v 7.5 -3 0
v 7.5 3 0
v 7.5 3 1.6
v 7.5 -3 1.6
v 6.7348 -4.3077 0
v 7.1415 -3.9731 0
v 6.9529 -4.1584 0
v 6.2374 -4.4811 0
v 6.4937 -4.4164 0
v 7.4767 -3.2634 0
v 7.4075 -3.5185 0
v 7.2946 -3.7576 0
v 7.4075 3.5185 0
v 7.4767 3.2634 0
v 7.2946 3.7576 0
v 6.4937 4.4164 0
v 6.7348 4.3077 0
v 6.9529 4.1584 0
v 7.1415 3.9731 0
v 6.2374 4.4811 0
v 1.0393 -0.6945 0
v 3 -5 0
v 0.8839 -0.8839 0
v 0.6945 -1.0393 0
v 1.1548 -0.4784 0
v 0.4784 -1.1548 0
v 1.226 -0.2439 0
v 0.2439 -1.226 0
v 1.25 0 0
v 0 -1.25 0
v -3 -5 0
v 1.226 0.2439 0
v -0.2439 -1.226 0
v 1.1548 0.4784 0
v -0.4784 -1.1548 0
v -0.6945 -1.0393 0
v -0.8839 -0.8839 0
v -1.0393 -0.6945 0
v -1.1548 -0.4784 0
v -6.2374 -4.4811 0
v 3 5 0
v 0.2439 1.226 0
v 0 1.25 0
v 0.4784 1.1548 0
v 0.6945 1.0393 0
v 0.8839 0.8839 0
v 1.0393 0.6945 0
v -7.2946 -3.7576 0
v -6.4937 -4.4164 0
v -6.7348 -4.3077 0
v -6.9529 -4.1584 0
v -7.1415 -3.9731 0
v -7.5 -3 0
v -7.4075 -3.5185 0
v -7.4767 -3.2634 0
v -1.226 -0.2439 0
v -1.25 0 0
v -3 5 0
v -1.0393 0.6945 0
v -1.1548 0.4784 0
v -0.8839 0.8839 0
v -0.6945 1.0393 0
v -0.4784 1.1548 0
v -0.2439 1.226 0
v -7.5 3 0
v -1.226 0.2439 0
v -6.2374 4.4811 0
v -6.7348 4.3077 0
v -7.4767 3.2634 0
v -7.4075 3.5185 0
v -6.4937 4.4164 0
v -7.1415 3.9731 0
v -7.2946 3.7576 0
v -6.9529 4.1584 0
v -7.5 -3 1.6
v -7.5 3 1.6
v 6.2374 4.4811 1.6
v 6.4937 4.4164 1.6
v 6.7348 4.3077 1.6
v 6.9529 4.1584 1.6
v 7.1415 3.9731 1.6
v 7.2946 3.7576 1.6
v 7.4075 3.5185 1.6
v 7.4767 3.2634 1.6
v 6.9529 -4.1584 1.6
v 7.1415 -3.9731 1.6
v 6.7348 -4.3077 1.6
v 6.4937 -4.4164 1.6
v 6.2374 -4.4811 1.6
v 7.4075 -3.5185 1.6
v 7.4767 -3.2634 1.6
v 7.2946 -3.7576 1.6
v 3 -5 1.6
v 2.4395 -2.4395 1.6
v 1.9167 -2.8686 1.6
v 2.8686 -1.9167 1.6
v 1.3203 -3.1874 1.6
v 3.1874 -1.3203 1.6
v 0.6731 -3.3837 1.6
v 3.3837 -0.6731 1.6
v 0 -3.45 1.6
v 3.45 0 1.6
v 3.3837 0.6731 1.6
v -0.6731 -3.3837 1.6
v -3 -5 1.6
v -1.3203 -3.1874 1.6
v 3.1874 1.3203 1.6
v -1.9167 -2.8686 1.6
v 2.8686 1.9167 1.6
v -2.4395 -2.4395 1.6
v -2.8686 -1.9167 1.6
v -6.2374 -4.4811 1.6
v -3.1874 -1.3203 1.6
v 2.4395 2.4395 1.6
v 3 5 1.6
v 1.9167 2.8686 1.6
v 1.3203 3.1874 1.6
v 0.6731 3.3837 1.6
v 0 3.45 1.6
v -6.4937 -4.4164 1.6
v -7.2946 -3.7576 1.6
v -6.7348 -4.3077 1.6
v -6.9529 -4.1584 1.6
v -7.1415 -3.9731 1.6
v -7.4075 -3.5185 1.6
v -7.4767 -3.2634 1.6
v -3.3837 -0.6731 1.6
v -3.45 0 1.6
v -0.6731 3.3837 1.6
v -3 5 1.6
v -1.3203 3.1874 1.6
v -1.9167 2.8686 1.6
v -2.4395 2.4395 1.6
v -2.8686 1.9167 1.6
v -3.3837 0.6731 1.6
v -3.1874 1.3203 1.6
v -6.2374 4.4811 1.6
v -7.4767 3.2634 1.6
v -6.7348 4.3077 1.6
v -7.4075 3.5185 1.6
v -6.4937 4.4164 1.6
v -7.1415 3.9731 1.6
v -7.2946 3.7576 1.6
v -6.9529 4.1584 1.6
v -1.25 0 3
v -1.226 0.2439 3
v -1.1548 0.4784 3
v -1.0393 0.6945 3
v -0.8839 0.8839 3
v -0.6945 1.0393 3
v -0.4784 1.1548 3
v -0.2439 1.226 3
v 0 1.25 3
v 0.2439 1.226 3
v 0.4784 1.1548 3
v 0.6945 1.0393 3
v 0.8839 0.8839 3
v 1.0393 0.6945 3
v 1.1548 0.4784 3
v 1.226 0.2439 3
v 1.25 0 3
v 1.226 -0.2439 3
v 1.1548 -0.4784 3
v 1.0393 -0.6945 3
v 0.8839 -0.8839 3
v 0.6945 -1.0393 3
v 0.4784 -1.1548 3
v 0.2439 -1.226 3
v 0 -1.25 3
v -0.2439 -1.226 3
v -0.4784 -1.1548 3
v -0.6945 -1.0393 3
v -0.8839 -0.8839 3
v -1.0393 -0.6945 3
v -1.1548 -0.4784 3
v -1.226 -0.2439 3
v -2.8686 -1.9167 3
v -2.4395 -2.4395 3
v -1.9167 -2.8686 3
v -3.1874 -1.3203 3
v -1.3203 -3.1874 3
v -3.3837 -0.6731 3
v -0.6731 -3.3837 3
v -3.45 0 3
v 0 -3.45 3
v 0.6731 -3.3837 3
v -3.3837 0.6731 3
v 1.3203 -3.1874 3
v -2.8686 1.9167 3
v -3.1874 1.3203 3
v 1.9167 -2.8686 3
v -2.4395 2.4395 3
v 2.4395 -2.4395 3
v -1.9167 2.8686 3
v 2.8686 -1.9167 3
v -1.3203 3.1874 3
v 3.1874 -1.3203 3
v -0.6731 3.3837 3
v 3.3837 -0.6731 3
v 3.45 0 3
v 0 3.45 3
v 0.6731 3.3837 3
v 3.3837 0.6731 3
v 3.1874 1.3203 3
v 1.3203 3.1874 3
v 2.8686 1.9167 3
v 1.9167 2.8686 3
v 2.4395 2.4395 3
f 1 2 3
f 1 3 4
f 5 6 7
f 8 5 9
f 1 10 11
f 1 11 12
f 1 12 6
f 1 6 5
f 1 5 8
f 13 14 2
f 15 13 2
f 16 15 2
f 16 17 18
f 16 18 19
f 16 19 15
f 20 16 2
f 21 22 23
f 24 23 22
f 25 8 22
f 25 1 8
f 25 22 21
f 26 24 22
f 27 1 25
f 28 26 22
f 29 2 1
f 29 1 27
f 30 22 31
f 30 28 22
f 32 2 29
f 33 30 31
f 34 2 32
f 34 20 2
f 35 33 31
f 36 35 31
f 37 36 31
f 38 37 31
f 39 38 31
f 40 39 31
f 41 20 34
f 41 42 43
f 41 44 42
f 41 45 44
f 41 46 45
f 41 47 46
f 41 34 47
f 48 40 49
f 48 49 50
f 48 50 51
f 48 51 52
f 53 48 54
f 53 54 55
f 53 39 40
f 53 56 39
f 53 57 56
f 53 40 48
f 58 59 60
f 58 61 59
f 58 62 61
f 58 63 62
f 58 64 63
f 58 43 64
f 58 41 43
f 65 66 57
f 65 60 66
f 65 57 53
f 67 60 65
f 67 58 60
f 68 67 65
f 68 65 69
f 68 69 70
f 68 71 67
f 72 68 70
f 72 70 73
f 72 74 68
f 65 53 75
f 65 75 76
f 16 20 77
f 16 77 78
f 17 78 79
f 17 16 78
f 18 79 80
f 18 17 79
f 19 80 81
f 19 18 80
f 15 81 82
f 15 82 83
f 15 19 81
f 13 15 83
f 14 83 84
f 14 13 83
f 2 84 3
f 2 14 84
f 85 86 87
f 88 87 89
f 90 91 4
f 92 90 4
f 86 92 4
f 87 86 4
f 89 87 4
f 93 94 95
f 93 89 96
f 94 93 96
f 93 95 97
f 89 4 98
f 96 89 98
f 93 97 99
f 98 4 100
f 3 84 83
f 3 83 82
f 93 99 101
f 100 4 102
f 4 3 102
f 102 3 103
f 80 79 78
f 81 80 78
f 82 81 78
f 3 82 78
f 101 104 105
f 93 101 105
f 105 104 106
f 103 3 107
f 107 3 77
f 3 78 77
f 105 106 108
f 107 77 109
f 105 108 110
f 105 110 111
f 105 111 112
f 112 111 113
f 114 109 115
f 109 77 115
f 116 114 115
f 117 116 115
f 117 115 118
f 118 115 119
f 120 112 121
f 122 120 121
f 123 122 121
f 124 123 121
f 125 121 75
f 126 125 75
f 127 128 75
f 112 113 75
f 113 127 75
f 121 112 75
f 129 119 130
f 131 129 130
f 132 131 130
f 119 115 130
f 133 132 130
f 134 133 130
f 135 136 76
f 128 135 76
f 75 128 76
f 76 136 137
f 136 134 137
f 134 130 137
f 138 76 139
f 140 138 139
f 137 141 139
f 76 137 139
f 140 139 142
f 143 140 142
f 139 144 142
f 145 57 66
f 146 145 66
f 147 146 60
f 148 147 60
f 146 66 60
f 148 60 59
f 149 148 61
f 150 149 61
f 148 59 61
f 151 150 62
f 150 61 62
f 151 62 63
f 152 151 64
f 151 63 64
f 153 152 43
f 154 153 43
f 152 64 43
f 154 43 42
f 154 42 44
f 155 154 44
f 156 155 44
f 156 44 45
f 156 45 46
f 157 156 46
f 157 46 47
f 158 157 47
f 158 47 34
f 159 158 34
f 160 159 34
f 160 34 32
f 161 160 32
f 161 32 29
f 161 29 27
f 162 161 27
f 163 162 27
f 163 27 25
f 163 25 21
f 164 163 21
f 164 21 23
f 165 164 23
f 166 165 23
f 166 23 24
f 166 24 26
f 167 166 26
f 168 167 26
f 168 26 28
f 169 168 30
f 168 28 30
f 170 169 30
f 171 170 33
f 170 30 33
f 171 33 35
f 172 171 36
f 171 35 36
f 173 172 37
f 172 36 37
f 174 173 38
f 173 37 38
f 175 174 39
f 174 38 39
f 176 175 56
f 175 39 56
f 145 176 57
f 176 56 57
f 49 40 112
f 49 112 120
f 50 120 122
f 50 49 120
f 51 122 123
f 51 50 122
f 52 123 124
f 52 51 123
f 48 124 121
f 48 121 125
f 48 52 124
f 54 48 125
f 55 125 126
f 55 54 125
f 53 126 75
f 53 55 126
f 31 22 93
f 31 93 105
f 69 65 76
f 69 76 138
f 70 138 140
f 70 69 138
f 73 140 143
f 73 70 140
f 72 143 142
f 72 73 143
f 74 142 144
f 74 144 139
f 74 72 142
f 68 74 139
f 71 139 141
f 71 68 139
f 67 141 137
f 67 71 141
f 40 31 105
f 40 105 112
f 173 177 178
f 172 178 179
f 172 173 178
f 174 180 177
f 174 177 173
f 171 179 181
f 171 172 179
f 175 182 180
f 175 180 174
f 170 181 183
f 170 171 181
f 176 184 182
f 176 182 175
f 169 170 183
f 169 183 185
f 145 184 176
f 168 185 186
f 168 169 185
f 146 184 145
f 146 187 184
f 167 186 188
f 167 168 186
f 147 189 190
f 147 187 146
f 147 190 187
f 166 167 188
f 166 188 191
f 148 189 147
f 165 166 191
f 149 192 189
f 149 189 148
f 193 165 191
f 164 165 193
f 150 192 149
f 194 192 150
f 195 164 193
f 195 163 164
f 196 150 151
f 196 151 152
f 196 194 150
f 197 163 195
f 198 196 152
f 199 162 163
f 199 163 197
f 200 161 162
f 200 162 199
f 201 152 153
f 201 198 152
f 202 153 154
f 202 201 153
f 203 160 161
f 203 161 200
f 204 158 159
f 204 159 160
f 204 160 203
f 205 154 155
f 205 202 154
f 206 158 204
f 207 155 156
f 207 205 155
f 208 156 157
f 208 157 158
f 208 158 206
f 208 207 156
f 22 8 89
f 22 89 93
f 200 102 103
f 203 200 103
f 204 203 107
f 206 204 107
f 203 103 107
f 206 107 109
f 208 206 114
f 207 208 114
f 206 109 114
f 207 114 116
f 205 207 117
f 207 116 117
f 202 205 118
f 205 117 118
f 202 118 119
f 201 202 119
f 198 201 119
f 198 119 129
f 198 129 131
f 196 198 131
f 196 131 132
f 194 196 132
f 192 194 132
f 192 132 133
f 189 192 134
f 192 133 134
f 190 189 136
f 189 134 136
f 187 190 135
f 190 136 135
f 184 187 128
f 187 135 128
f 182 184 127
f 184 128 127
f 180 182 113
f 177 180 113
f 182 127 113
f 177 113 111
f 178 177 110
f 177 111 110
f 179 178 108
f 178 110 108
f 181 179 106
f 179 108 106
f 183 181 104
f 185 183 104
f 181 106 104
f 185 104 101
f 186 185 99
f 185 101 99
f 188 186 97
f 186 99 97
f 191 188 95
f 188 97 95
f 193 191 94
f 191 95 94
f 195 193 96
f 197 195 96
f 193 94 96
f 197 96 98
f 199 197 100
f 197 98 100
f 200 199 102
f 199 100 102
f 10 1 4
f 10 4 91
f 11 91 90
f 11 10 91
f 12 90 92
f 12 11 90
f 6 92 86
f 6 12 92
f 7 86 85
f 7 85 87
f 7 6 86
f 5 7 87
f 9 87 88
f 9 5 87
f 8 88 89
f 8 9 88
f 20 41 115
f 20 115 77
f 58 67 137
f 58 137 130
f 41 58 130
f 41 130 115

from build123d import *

# Parameters (mm, degrees)
BOSS_EXTRUDE1_DEPTH   = 1.6
SKETCH2_R             = 3.45
BOSS_EXTRUDE2_DEPTH   = 1.4
M3X0_5_TAPPED_HOLE1_D = 2.5


with BuildPart() as part:
    # Sketch1 → Boss-Extrude1 (new body)
    with BuildSketch(Plane.XY):
        with BuildLine():
            Line((-6.237396753, 4.481095129), (-3, 5))
            Line((-3, 5), (3, 5))
            Line((3, 5), (6.237396753, 4.481095129))
            ThreePointArc((6.237396753, 4.481095129), (7.141511088, 3.973114811), (7.5, 3))
            Line((7.5, 3), (7.5, -3))
            ThreePointArc((7.5, -3), (7.141511088, -3.973114811), (6.237396753, -4.481095129))
            Line((6.237396753, -4.481095129), (3, -5))
            Line((3, -5), (-3, -5))
            Line((-3, -5), (-6.237396753, -4.481095129))
            ThreePointArc((-6.237396753, -4.481095129), (-7.141511088, -3.973114811), (-7.5, -3))
            Line((-7.5, -3), (-7.5, 3))
            ThreePointArc((-7.5, 3), (-7.141511088, 3.973114811), (-6.237396753, 4.481095129))
        make_face()
    extrude(amount=BOSS_EXTRUDE1_DEPTH)

    # Sketch2 → Boss-Extrude2 (add)
    with BuildSketch(Plane.XY.offset(1.6)):
        Circle(SKETCH2_R)
    extrude(amount=BOSS_EXTRUDE2_DEPTH)

    # M3x0.5 Tapped Hole1 (through all)
    with Locations(Plane.XY.offset(3)):
        with Locations((0, 0)):
            Hole(M3X0_5_TAPPED_HOLE1_D / 2)


solid = part.part
